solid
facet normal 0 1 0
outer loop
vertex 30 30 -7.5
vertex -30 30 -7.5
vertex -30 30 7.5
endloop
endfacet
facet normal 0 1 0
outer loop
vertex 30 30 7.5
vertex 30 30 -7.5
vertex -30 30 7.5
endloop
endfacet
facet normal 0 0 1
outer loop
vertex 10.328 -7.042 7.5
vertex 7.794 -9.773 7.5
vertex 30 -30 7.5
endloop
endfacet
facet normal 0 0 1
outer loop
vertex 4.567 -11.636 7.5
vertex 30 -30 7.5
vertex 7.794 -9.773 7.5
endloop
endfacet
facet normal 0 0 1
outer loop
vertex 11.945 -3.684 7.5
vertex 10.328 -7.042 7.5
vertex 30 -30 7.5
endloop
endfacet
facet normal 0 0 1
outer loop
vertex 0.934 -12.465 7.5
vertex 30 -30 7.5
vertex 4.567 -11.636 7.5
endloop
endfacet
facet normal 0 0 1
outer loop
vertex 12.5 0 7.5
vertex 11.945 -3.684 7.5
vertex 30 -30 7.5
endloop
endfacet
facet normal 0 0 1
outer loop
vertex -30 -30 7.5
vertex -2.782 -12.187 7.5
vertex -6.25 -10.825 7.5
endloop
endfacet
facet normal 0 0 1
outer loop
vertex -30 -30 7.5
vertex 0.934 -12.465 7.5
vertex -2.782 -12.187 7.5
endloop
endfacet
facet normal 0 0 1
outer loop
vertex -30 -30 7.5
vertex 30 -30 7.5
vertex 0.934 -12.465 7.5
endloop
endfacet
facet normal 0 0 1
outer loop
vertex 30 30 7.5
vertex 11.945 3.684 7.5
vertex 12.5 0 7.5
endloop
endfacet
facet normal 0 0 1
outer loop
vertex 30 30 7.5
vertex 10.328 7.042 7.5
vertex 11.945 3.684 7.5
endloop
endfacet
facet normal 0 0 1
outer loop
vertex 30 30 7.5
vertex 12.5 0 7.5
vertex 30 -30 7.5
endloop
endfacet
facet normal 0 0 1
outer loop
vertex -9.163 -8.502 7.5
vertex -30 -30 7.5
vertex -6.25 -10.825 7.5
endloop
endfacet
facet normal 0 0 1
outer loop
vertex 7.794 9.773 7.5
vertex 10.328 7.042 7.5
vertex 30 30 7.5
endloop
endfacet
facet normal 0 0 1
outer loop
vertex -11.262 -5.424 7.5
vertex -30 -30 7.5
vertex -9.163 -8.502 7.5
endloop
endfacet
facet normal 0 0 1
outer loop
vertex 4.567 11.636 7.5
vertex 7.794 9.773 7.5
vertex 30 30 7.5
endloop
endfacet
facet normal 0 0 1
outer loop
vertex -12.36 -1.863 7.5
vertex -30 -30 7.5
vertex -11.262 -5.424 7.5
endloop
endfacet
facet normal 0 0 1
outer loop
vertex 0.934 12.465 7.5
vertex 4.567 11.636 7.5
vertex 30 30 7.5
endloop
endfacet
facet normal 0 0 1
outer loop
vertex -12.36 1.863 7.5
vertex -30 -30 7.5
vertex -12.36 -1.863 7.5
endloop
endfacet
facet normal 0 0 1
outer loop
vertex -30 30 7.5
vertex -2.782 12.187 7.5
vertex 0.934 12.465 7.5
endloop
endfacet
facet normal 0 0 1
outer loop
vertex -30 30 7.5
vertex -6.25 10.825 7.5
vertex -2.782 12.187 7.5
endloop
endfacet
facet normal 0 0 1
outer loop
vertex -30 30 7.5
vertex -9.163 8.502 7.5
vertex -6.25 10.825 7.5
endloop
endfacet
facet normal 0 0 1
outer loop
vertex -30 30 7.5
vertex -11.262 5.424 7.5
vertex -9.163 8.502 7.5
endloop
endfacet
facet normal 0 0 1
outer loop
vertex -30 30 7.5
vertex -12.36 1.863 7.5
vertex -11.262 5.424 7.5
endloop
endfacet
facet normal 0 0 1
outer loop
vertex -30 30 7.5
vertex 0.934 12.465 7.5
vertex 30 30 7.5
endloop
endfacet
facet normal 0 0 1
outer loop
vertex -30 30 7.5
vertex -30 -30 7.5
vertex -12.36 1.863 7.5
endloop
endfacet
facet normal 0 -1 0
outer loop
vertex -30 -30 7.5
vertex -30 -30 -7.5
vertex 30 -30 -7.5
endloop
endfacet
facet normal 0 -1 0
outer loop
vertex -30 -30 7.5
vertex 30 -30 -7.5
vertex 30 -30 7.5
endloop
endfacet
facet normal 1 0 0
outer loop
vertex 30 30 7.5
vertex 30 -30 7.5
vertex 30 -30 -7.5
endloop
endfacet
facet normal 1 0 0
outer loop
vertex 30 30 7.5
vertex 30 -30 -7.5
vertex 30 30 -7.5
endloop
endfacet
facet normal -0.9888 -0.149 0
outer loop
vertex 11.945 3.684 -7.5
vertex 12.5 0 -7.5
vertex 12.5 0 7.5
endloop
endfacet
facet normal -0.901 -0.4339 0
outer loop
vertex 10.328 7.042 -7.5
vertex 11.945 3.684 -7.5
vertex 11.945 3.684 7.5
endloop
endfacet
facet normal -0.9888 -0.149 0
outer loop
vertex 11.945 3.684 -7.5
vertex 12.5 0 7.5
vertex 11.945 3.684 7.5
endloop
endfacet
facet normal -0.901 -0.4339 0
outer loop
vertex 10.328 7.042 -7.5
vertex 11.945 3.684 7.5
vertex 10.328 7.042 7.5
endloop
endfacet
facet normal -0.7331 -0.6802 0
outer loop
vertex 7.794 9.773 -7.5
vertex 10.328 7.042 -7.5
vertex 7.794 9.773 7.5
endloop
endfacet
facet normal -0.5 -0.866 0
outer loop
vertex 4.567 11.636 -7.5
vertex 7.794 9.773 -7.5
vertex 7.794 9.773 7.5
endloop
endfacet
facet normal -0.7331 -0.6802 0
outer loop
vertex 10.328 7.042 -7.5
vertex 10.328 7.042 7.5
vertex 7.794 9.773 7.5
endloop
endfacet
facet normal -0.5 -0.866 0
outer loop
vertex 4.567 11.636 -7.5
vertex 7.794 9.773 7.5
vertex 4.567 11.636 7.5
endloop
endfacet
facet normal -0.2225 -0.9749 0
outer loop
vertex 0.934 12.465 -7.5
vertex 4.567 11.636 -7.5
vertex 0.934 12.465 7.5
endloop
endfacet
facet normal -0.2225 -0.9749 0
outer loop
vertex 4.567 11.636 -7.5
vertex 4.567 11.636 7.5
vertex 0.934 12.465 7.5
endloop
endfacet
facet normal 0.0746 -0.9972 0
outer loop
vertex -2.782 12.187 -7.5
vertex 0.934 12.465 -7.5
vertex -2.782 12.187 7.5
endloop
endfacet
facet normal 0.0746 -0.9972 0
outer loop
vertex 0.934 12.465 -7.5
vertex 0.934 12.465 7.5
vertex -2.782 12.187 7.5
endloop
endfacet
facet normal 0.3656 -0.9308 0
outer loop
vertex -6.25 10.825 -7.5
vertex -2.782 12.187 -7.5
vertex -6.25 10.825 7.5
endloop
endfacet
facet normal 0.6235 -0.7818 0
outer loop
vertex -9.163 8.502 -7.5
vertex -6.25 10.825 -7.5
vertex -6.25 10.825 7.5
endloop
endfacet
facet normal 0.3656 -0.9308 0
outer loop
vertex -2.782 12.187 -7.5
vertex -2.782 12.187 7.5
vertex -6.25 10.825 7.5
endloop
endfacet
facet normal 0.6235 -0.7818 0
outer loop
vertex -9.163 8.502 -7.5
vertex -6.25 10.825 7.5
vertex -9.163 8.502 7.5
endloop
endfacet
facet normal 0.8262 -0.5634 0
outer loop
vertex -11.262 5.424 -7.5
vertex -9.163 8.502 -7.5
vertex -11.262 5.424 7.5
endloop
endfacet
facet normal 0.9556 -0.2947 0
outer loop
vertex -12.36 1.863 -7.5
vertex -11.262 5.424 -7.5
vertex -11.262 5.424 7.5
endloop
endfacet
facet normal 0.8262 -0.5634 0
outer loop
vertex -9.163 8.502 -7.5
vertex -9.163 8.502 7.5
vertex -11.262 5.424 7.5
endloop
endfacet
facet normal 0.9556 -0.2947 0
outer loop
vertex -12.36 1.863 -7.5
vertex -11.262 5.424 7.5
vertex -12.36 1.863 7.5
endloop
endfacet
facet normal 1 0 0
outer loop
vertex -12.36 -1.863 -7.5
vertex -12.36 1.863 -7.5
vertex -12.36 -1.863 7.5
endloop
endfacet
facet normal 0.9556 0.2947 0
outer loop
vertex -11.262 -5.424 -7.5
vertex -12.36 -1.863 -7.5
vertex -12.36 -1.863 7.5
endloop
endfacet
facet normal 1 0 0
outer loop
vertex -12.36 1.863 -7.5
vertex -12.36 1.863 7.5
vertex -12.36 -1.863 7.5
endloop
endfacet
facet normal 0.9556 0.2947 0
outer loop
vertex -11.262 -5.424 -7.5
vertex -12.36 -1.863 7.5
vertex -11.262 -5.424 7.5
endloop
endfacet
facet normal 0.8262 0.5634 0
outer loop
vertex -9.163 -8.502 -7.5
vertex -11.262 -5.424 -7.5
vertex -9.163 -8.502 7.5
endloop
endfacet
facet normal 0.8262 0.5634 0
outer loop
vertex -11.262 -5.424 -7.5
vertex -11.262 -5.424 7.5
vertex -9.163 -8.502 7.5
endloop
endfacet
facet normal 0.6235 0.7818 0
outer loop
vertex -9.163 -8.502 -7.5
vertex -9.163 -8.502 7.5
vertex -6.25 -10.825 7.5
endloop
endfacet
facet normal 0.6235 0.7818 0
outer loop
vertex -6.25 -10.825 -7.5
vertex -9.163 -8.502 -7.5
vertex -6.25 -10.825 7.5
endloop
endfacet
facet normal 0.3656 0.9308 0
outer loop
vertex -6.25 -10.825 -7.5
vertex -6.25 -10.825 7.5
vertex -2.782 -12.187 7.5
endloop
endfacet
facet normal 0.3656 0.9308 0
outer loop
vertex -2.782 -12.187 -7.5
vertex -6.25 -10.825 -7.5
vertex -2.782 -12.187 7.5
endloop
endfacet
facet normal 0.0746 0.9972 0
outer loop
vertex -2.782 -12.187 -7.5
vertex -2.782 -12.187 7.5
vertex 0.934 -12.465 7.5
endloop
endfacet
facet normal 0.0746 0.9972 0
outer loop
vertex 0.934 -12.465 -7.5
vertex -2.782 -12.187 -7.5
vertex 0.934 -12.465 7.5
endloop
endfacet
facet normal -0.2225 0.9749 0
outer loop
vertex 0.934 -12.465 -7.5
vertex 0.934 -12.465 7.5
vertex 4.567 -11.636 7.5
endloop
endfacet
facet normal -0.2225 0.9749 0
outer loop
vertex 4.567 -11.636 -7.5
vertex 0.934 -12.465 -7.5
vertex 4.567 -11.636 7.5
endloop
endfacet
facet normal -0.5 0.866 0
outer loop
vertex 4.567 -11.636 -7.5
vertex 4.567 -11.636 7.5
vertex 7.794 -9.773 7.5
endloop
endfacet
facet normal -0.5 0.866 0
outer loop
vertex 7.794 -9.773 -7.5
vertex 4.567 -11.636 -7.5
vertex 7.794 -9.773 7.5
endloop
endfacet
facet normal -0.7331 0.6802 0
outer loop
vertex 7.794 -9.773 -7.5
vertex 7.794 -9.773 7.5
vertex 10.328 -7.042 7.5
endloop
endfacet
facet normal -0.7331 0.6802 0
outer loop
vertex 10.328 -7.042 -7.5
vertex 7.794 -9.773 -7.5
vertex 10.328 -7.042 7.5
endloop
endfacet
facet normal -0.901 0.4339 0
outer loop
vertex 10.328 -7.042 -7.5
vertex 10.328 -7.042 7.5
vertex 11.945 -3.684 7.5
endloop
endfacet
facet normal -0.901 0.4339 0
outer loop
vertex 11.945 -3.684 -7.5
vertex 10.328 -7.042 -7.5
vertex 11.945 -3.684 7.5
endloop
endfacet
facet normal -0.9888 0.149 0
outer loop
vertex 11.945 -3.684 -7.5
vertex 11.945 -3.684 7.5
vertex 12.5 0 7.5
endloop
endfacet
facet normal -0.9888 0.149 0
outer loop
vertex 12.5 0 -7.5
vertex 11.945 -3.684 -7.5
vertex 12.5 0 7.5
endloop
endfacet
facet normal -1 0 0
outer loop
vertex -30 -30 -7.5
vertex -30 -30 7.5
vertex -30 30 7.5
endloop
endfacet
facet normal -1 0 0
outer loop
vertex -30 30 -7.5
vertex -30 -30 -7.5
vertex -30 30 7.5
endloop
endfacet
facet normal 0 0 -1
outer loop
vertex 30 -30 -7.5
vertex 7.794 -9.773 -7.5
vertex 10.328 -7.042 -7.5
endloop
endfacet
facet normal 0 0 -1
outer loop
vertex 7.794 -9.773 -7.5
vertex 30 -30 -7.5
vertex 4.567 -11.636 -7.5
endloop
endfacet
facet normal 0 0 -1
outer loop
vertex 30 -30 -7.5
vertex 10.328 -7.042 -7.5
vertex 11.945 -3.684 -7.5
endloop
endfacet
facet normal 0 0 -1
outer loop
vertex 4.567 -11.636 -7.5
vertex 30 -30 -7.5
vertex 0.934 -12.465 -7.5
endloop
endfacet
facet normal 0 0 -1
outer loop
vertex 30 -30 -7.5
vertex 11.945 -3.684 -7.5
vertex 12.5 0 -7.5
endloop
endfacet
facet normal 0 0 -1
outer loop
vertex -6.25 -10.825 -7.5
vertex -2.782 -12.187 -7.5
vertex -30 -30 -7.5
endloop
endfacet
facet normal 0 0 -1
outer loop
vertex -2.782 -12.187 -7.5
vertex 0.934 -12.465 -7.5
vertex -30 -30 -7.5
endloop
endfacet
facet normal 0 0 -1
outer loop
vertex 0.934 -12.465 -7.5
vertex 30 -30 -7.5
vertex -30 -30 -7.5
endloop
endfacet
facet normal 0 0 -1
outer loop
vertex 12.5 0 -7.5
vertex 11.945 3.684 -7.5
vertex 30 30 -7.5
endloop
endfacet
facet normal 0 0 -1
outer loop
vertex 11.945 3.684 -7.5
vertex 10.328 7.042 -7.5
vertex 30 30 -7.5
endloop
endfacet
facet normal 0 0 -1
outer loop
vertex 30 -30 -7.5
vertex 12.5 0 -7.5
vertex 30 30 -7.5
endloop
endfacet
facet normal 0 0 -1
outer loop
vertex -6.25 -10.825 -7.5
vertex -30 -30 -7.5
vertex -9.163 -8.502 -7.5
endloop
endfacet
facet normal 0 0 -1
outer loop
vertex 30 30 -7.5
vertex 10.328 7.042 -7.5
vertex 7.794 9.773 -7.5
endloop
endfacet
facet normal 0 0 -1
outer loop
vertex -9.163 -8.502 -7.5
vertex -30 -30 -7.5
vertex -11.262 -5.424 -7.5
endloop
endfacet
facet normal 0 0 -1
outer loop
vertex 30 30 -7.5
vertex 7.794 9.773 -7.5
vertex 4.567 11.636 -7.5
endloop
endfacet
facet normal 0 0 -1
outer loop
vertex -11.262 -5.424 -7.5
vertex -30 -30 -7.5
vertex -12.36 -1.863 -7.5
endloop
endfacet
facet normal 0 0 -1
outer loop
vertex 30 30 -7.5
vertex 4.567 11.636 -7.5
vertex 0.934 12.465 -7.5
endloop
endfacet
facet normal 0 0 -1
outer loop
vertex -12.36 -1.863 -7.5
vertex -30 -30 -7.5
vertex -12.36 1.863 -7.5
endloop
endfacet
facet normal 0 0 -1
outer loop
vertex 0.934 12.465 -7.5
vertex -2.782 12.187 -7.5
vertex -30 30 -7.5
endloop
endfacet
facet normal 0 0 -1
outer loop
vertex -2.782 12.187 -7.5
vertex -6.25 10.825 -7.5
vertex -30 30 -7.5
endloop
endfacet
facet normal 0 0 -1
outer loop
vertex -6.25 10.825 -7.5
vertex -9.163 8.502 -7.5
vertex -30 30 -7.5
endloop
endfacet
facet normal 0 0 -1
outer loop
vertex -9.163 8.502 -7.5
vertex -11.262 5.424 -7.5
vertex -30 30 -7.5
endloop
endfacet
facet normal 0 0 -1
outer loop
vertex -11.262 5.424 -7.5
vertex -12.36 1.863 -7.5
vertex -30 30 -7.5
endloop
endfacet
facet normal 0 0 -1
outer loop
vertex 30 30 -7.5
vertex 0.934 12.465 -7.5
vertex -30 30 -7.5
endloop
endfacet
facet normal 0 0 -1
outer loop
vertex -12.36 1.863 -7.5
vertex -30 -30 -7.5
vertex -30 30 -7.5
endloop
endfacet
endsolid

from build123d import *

# Parameters (mm, degrees)
PLAT_W                      = 60
PLAT_H                      = 15
EL_MENT_M_CANO_SOUD_1_DEPTH = 60
ESQUISSE2_R                 = 12.5
ENL_V_MAT_EXTRU_1_DEPTH     = 20


with BuildPart() as part:
    # plat → Elément mécano-soudé1 (new body)
    with BuildSketch(Plane.YZ.offset(-30)):
        Rectangle(PLAT_W, PLAT_H)
    extrude(amount=EL_MENT_M_CANO_SOUD_1_DEPTH)

    # Esquisse2 → Enlèv. mat.-Extru.1 (cut)
    with BuildSketch(Plane.XY.offset(7.5)):
        Circle(ESQUISSE2_R)
    extrude(amount=-ENL_V_MAT_EXTRU_1_DEPTH, mode=Mode.SUBTRACT)


solid = part.part
